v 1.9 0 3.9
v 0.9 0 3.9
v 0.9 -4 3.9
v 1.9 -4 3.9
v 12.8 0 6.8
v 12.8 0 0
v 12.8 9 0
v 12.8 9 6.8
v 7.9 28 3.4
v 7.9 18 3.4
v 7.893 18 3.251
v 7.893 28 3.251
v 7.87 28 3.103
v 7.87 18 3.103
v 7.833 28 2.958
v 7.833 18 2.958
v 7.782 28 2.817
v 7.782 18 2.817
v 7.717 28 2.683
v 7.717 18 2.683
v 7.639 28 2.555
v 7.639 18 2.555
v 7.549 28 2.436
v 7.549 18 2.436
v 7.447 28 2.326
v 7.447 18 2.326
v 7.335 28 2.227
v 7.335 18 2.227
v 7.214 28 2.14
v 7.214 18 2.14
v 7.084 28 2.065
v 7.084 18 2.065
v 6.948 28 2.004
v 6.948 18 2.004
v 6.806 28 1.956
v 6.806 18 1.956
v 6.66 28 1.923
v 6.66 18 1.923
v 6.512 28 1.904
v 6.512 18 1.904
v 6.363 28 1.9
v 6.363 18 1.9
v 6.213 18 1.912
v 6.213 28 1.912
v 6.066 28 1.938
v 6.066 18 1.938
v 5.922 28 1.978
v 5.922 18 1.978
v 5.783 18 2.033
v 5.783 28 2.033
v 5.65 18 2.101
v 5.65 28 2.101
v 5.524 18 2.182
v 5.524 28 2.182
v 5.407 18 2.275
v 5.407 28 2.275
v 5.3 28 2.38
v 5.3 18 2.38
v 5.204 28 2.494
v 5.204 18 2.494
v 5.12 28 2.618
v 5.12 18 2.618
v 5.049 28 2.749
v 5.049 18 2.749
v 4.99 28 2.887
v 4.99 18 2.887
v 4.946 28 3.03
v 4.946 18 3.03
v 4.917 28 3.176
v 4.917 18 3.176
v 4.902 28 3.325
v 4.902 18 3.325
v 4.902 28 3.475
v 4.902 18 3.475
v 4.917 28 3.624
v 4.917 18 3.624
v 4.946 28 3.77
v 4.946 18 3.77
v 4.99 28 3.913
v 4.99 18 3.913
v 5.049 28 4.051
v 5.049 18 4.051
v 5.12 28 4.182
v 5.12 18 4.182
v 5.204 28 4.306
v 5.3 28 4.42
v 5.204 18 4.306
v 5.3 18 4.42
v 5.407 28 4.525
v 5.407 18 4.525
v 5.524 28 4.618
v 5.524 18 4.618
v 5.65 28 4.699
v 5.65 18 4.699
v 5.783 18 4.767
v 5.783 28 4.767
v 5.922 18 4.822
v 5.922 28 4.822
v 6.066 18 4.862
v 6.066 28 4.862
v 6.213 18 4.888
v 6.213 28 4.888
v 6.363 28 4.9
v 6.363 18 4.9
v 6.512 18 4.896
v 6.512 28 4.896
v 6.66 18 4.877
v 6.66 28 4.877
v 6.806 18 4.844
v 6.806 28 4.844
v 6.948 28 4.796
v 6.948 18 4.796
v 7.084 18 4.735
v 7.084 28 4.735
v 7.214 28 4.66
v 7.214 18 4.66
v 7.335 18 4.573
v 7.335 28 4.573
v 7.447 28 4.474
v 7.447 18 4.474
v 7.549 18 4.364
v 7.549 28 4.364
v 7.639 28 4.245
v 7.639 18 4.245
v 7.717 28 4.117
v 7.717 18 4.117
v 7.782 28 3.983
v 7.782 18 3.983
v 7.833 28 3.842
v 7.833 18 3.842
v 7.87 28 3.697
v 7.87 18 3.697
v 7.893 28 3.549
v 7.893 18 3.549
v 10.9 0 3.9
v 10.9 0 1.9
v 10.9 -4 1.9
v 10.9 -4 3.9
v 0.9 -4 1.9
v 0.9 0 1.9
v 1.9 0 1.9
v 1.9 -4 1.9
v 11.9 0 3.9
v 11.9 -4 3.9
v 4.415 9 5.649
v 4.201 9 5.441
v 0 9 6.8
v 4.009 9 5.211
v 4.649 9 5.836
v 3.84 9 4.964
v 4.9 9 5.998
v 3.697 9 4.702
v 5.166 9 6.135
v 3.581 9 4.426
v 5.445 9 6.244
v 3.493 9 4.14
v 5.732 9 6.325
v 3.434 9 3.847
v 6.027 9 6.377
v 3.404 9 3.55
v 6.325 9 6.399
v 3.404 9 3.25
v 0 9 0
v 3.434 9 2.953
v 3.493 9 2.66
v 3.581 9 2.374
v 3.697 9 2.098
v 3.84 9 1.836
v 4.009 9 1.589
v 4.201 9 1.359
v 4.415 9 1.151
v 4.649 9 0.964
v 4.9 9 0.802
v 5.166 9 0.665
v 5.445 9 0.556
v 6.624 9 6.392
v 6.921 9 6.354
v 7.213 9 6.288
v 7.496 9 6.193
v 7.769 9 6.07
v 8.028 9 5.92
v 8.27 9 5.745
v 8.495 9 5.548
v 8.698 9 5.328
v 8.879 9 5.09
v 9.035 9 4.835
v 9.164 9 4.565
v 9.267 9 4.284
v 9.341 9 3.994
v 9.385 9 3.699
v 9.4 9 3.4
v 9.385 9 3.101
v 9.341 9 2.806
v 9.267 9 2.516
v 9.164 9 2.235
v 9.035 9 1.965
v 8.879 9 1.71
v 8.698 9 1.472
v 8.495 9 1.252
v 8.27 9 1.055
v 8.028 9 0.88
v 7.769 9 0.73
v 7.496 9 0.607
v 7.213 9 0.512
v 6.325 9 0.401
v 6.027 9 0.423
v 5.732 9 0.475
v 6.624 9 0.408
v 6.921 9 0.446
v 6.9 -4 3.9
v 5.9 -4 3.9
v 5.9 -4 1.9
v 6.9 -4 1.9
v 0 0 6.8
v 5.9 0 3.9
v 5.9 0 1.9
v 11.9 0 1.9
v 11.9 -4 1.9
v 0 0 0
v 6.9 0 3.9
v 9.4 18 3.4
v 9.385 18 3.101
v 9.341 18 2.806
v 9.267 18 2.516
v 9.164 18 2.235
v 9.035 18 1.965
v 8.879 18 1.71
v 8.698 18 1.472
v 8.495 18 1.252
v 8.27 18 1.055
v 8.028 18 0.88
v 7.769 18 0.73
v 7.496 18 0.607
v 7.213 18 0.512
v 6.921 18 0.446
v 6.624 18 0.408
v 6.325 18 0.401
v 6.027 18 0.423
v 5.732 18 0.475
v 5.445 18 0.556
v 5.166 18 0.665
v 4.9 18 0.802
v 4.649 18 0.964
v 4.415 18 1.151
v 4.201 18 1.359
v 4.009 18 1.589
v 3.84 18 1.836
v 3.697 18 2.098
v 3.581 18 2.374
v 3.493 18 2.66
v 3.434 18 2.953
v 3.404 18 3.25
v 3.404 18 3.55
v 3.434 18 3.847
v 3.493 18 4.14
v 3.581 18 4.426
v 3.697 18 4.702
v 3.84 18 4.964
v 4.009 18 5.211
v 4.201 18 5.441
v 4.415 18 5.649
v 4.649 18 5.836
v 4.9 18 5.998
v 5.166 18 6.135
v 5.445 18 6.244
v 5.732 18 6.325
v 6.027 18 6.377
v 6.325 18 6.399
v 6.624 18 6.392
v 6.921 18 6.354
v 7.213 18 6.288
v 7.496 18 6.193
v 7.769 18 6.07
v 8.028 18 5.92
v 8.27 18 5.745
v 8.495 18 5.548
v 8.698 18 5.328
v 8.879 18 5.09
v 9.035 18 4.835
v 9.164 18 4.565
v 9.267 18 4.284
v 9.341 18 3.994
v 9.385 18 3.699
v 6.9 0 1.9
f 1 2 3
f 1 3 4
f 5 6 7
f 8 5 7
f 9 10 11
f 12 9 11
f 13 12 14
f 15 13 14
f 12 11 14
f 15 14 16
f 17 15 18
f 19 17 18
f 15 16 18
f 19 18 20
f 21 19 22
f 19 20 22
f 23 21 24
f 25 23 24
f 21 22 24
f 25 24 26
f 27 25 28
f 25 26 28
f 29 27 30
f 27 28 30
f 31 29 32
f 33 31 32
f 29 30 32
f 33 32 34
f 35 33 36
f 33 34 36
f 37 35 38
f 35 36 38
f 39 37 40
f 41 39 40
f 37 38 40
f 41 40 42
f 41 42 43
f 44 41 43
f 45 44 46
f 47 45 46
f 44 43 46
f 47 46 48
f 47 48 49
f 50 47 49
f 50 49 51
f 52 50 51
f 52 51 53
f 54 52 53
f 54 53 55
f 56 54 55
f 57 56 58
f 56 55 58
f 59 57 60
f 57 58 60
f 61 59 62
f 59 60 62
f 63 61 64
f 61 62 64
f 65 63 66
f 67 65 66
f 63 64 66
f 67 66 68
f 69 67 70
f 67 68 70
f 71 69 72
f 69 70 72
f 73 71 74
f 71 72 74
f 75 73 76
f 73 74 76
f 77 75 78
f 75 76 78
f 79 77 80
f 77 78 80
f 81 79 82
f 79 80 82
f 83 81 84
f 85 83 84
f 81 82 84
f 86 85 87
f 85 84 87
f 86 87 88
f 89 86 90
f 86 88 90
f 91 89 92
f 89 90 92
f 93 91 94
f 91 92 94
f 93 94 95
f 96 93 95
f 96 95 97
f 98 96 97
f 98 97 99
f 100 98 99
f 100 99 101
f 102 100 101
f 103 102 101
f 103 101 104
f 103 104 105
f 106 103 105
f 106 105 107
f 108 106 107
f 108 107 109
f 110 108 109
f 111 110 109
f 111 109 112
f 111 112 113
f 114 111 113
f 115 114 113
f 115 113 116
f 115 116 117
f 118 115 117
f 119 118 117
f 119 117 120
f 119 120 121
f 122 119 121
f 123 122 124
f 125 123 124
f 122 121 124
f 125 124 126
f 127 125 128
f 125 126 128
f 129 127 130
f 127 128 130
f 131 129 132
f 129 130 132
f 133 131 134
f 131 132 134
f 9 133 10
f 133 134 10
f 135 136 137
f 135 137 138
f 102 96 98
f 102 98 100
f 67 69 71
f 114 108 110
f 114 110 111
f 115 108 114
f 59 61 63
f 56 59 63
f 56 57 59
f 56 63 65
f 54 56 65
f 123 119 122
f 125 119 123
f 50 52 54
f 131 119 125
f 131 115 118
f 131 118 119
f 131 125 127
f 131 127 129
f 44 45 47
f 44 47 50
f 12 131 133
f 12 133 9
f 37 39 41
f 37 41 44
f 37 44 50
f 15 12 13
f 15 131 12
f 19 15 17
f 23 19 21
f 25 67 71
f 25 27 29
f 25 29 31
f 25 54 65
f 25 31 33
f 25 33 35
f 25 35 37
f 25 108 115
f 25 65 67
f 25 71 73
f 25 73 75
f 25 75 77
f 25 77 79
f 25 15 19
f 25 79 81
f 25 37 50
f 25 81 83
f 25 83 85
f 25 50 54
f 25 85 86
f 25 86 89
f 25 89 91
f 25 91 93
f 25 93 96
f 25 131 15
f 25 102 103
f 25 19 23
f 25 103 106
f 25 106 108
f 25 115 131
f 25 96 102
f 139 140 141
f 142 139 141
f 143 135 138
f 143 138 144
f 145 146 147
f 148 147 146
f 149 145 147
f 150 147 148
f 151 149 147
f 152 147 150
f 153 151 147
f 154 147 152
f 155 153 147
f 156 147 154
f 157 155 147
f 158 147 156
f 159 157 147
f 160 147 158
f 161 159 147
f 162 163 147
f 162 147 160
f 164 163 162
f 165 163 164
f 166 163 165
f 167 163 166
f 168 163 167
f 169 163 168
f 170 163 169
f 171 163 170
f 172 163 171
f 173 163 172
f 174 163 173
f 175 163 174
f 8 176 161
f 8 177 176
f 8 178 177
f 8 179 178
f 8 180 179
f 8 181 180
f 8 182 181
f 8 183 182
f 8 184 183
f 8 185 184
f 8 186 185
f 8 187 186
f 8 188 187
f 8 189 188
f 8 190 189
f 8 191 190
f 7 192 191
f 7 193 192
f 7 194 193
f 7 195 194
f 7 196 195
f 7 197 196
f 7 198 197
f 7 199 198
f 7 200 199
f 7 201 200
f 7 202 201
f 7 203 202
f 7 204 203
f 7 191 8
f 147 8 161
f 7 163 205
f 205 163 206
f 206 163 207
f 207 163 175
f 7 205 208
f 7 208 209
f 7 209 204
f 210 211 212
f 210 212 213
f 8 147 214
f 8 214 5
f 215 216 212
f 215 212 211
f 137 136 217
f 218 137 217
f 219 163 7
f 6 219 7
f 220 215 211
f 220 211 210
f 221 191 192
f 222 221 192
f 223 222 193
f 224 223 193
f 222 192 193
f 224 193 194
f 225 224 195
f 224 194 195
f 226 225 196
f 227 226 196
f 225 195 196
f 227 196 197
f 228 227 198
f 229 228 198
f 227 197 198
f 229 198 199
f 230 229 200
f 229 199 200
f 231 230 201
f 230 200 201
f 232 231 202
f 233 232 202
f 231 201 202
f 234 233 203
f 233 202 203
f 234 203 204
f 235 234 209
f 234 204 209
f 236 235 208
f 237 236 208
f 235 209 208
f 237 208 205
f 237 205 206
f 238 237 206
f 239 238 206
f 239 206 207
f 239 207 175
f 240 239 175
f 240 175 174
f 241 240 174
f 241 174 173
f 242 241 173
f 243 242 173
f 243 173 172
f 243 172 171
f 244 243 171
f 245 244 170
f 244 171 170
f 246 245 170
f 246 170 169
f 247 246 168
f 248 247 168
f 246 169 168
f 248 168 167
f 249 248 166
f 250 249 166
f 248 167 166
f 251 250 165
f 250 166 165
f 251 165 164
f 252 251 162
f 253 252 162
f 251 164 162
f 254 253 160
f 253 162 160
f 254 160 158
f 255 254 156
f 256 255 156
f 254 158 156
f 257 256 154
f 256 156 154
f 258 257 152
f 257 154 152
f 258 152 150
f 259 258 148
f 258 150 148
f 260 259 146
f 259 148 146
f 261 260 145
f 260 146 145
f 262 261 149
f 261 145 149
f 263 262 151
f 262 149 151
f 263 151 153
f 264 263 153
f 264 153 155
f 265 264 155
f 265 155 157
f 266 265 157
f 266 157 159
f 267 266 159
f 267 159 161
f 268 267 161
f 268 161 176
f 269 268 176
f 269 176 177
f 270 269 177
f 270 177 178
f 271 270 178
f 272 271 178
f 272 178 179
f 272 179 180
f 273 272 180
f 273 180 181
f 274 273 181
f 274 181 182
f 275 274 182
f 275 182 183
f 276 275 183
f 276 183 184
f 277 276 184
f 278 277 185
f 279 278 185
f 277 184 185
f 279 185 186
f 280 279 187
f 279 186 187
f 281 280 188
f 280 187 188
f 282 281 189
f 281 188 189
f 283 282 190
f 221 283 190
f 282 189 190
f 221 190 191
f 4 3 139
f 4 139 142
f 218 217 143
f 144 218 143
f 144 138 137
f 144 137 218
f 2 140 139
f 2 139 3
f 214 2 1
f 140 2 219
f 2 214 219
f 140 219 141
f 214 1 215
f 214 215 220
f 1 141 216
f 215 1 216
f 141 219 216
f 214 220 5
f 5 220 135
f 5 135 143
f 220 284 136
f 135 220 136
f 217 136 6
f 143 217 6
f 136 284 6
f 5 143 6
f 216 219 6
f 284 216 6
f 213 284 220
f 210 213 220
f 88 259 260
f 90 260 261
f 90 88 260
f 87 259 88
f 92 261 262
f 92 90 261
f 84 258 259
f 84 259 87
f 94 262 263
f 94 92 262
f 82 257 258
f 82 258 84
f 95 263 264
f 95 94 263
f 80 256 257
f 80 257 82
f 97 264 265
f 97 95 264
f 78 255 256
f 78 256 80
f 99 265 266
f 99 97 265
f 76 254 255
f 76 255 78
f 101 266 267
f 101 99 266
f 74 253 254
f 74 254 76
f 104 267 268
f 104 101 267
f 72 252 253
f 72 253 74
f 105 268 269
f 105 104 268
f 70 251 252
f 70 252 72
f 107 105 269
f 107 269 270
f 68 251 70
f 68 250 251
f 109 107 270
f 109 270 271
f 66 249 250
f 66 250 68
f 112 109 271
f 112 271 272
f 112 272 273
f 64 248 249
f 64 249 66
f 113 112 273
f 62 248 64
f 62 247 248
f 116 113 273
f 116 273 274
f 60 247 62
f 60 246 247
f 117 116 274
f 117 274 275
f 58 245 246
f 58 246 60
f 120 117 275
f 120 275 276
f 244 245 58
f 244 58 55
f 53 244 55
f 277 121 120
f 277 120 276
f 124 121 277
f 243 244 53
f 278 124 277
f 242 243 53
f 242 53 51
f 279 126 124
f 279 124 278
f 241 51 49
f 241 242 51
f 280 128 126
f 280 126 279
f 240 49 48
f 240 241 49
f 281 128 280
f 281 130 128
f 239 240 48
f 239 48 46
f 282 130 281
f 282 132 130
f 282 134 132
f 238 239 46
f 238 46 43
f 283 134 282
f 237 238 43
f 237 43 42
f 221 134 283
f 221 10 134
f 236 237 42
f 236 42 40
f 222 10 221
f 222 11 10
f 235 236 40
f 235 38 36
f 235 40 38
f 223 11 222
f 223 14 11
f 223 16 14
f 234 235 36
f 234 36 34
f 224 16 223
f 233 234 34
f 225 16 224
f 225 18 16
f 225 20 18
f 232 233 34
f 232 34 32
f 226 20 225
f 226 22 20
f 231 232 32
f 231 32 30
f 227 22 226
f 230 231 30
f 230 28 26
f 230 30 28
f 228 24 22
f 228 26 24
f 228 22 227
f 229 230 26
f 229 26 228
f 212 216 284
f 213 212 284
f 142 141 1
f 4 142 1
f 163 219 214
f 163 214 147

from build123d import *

# Parameters (mm, degrees)
ESQUISSE1_W        = 12.8
ESQUISSE1_H        = 9
BOSS_EXTRU_1_DEPTH = 6.8
ESQUISSE2_W        = 1
ESQUISSE2_H        = 2
BOSS_EXTRU_2_DEPTH = 4
ESQUISSE3_R        = 3
BOSS_EXTRU_3_DEPTH = 9
ESQUISSE4_R        = 1.5
BOSS_EXTRU_4_DEPTH = 10


with BuildPart() as part:
    # Esquisse1 → Boss.-Extru.1 (new body)
    with BuildSketch(Plane.XY):
        with Locations((6.4, 4.5)):
            Rectangle(ESQUISSE1_W, ESQUISSE1_H)
    extrude(amount=BOSS_EXTRU_1_DEPTH)

    # Esquisse2 → Boss.-Extru.2 (add)
    with BuildSketch(Plane.XZ):
        with Locations((1.4, 2.9)):
            Rectangle(ESQUISSE2_W, ESQUISSE2_H)
        with Locations((6.4, 2.9)):
            Rectangle(ESQUISSE2_W, ESQUISSE2_H)
        with Locations((11.4, 2.9)):
            Rectangle(ESQUISSE2_W, ESQUISSE2_H)
    extrude(amount=BOSS_EXTRU_2_DEPTH)

    # Esquisse3 → Boss.-Extru.3 (add)
    with BuildSketch(Plane(origin=(0, 9, 0), x_dir=(1, 0, 0), z_dir=(0, 1, 0))):
        with Locations((6.4, -3.4)):
            Circle(ESQUISSE3_R)
    extrude(amount=BOSS_EXTRU_3_DEPTH)

    # Esquisse4 → Boss.-Extru.4 (add)
    with BuildSketch(Plane(origin=(0, 18, 0), x_dir=(1, 0, 0), z_dir=(0, 1, 0))):
        with Locations((6.4, -3.4)):
            Circle(ESQUISSE4_R)
    extrude(amount=BOSS_EXTRU_4_DEPTH)


solid = part.part
